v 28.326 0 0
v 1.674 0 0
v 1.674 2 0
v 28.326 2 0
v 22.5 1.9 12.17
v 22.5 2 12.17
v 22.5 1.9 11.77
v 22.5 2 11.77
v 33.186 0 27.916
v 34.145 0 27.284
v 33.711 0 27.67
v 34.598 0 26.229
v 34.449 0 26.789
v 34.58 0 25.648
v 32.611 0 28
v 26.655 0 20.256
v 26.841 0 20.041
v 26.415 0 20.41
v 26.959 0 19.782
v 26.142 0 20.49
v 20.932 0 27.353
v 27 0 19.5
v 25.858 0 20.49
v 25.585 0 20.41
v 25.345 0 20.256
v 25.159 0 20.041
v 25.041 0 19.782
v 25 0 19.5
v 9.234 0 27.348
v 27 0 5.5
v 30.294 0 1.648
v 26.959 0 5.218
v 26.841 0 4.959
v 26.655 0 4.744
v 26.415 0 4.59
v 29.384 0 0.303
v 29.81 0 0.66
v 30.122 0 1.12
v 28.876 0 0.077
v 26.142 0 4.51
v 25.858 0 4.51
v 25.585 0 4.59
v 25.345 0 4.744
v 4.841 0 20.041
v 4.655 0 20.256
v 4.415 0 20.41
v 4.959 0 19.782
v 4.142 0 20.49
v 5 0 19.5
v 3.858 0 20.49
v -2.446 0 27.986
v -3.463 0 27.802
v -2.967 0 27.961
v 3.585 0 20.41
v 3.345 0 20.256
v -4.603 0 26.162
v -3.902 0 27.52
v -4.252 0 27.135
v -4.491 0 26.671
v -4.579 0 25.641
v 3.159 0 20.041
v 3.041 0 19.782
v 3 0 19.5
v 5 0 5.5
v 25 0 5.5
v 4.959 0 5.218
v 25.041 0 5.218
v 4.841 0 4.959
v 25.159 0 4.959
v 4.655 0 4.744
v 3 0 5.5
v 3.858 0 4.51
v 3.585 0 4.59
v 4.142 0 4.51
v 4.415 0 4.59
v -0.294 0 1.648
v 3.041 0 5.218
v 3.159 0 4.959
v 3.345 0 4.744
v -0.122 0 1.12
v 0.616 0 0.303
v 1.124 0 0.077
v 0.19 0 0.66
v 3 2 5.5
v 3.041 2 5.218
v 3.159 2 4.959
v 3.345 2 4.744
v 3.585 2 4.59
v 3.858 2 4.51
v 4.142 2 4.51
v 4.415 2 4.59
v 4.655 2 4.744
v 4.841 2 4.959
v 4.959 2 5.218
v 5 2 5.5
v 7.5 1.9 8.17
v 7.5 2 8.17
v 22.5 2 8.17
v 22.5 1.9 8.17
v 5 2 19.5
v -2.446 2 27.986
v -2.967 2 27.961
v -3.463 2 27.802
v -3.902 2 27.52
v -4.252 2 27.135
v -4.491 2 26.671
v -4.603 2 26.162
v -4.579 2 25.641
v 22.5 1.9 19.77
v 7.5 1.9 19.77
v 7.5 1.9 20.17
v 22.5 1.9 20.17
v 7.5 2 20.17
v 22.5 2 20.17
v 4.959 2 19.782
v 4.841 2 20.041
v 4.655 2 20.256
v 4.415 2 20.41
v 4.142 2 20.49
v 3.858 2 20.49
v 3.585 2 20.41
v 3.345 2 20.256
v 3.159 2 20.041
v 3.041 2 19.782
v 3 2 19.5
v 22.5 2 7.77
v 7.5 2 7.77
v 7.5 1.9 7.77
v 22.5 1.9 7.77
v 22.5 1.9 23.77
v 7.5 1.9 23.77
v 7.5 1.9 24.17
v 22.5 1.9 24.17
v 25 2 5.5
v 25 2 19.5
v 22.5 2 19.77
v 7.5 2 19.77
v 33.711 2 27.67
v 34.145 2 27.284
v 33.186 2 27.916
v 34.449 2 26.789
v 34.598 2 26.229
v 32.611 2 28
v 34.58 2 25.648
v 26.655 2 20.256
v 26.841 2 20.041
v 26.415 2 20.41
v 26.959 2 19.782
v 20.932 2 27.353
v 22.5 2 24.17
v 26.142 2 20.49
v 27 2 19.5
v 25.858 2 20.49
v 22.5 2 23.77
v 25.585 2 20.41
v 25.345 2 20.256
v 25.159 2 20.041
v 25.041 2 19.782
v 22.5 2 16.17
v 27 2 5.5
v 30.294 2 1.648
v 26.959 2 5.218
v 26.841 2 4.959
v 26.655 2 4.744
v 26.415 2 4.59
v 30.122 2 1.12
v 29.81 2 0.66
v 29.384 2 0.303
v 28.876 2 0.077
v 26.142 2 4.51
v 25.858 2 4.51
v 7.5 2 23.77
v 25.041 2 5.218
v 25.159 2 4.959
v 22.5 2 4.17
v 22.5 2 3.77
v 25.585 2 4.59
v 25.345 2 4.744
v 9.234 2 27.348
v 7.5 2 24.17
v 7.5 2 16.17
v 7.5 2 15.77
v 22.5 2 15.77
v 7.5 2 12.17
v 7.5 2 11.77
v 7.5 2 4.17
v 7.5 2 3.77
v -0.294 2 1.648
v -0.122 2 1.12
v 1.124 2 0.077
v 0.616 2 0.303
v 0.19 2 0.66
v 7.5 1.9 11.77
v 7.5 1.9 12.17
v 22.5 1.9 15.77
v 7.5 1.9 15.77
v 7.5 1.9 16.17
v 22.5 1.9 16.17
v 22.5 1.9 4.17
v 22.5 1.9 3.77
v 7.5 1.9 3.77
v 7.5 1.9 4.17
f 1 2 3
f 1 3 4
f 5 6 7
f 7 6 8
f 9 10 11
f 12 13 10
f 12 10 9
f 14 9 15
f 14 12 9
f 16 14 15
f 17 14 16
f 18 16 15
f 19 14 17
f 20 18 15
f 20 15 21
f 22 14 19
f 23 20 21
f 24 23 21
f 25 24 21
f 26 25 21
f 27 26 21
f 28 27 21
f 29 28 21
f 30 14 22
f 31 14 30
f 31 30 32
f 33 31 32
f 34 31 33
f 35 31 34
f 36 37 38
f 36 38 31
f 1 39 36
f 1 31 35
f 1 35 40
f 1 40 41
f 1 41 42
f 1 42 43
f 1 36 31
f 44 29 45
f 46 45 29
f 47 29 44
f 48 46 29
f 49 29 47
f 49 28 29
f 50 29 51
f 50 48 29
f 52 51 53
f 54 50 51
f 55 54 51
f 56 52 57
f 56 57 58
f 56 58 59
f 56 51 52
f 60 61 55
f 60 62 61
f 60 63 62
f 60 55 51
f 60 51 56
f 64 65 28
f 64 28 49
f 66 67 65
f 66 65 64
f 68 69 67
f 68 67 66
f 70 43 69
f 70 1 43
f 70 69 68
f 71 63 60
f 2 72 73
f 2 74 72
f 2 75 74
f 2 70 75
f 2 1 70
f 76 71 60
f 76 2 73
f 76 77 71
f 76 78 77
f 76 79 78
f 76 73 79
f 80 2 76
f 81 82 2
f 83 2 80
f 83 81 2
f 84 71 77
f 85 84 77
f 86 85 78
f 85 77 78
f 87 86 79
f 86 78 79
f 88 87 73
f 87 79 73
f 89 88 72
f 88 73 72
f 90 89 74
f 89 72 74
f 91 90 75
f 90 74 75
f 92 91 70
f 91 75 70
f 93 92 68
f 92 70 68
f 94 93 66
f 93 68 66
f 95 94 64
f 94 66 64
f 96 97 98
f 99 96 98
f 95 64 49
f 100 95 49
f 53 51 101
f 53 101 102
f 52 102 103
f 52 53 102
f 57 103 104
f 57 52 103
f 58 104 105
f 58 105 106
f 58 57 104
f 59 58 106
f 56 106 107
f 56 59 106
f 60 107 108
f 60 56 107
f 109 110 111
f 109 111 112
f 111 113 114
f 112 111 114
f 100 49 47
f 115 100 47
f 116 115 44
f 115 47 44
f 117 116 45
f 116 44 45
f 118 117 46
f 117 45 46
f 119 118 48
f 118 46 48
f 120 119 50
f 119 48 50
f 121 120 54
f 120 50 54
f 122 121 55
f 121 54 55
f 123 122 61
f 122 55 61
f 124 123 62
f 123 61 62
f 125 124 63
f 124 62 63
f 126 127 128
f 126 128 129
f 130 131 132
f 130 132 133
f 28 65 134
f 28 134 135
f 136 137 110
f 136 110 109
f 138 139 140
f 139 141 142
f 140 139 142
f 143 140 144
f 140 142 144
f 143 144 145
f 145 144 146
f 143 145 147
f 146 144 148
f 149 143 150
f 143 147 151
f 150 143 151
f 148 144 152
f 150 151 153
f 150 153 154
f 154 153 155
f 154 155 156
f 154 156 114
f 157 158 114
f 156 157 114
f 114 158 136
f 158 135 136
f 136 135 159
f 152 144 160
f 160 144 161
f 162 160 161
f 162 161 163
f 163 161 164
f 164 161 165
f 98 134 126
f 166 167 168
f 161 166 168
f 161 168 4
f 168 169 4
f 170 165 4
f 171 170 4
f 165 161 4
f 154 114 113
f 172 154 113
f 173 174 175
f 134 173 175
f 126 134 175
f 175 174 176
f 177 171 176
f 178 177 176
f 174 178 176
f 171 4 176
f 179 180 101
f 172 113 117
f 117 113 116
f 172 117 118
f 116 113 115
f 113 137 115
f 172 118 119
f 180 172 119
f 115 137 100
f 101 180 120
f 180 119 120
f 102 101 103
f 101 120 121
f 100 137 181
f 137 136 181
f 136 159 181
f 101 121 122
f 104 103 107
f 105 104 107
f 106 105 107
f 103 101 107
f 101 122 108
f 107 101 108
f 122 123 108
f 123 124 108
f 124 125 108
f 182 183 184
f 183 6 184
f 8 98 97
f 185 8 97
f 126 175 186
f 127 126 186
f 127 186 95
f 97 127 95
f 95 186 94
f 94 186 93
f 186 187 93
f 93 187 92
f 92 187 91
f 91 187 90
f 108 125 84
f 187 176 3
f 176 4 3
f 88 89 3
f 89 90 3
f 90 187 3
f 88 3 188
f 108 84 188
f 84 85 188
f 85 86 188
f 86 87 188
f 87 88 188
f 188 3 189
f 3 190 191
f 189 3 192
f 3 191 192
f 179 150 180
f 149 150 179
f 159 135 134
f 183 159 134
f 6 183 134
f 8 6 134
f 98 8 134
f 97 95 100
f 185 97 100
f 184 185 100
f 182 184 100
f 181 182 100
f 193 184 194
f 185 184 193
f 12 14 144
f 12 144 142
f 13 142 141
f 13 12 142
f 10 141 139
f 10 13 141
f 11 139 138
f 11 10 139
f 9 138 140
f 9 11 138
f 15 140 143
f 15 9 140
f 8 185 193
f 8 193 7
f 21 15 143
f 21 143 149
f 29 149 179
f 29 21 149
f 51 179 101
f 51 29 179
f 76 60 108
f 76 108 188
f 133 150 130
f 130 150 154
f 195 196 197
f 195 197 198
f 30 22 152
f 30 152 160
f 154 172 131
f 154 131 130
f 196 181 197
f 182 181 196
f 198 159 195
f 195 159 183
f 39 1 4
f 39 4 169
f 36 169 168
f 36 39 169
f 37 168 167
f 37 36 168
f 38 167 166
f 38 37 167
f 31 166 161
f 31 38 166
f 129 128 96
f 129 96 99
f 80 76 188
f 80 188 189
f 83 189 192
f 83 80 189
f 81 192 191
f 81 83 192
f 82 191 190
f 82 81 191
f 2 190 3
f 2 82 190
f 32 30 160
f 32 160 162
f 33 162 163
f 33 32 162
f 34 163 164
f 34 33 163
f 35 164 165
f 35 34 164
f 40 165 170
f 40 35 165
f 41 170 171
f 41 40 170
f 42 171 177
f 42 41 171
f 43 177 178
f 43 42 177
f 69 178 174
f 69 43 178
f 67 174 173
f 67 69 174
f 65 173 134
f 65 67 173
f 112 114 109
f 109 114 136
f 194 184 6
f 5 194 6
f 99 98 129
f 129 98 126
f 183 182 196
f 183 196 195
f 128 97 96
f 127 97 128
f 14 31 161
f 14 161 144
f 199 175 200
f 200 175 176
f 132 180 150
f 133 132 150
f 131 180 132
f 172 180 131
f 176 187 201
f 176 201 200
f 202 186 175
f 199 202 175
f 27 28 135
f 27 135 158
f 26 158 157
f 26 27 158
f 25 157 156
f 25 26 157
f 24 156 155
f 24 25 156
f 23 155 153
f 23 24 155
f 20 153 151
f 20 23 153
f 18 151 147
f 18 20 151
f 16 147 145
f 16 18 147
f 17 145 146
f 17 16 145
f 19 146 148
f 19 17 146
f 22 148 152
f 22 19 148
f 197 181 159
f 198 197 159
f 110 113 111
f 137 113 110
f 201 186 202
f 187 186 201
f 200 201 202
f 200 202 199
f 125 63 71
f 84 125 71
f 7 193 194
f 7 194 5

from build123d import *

# Parameters (mm, degrees)
RESSALTO_EXTRUS_O1_DEPTH = 2
ESBO_O2_W                = 15
ESBO_O2_H                = 0.4
CORTE_EXTRUS_O1_DEPTH    = 0.1
PADR_O_LINEAR1_COUNT     = 6
PADR_O_LINEAR1_PITCH     = 4


with BuildPart() as part:
    # Esboço1 → Ressalto-extrusão1 (new body)
    with BuildSketch(Plane(origin=(0, 0, 0), x_dir=(1, 0, 0), z_dir=(0, 1, 0))):
        with BuildLine():
            Line((1.674494665, 0), (28.325505335, 0))
            ThreePointArc((28.325505335, 0), (29.609412934, -0.466513359), (30.294360486, -1.648418723))
            Line((30.294360486, -1.648418723), (34.580074772, -25.648418723))
            ThreePointArc((34.580074772, -25.648418723), (34.144706262, -27.283907599), (32.611219621, -28))
            ThreePointArc((32.611219621, -28), (15.082885827, -27.269989968), (-2.446011347, -27.98634468))
            ThreePointArc((-2.446011347, -27.98634468), (-4.089503342, -27.338819548), (-4.578838652, -25.641496454))
            Line((-4.578838652, -25.641496454), (-0.294360486, -1.648418723))
            ThreePointArc((-0.294360486, -1.648418723), (0.390587066, -0.466513359), (1.674494665, 0))
        make_face()
        with BuildLine():
            Line((5, -5.5), (5, -19.5))
            ThreePointArc((5, -19.5), (4, -20.5), (3, -19.5))
            Line((3, -19.5), (3, -5.5))
            ThreePointArc((3, -5.5), (4, -4.5), (5, -5.5))
        make_face(mode=Mode.SUBTRACT)
        with BuildLine():
            Line((25, -5.5), (25, -19.5))
            ThreePointArc((25, -19.5), (26, -20.5), (27, -19.5))
            Line((27, -19.5), (27, -5.5))
            ThreePointArc((27, -5.5), (26, -4.5), (25, -5.5))
        make_face(mode=Mode.SUBTRACT)
    extrude(amount=RESSALTO_EXTRUS_O1_DEPTH)

    # Esboço2 → Corte-extrusão1 (cut)
    with BuildSketch(Plane(origin=(0, 2, 0), x_dir=(1, 0, 0), z_dir=(0, 1, 0))):
        with Locations((15, -23.969622092)):
            Rectangle(ESBO_O2_W, ESBO_O2_H)
    corte_extrus_o1 = extrude(amount=-CORTE_EXTRUS_O1_DEPTH, mode=Mode.SUBTRACT)

    # Padrão linear1: Corte-extrusão1 ×6
    with Locations(*[(0, 0, -i * PADR_O_LINEAR1_PITCH) for i in range(1, PADR_O_LINEAR1_COUNT)]):
        add(corte_extrus_o1, mode=Mode.SUBTRACT)


solid = part.part
